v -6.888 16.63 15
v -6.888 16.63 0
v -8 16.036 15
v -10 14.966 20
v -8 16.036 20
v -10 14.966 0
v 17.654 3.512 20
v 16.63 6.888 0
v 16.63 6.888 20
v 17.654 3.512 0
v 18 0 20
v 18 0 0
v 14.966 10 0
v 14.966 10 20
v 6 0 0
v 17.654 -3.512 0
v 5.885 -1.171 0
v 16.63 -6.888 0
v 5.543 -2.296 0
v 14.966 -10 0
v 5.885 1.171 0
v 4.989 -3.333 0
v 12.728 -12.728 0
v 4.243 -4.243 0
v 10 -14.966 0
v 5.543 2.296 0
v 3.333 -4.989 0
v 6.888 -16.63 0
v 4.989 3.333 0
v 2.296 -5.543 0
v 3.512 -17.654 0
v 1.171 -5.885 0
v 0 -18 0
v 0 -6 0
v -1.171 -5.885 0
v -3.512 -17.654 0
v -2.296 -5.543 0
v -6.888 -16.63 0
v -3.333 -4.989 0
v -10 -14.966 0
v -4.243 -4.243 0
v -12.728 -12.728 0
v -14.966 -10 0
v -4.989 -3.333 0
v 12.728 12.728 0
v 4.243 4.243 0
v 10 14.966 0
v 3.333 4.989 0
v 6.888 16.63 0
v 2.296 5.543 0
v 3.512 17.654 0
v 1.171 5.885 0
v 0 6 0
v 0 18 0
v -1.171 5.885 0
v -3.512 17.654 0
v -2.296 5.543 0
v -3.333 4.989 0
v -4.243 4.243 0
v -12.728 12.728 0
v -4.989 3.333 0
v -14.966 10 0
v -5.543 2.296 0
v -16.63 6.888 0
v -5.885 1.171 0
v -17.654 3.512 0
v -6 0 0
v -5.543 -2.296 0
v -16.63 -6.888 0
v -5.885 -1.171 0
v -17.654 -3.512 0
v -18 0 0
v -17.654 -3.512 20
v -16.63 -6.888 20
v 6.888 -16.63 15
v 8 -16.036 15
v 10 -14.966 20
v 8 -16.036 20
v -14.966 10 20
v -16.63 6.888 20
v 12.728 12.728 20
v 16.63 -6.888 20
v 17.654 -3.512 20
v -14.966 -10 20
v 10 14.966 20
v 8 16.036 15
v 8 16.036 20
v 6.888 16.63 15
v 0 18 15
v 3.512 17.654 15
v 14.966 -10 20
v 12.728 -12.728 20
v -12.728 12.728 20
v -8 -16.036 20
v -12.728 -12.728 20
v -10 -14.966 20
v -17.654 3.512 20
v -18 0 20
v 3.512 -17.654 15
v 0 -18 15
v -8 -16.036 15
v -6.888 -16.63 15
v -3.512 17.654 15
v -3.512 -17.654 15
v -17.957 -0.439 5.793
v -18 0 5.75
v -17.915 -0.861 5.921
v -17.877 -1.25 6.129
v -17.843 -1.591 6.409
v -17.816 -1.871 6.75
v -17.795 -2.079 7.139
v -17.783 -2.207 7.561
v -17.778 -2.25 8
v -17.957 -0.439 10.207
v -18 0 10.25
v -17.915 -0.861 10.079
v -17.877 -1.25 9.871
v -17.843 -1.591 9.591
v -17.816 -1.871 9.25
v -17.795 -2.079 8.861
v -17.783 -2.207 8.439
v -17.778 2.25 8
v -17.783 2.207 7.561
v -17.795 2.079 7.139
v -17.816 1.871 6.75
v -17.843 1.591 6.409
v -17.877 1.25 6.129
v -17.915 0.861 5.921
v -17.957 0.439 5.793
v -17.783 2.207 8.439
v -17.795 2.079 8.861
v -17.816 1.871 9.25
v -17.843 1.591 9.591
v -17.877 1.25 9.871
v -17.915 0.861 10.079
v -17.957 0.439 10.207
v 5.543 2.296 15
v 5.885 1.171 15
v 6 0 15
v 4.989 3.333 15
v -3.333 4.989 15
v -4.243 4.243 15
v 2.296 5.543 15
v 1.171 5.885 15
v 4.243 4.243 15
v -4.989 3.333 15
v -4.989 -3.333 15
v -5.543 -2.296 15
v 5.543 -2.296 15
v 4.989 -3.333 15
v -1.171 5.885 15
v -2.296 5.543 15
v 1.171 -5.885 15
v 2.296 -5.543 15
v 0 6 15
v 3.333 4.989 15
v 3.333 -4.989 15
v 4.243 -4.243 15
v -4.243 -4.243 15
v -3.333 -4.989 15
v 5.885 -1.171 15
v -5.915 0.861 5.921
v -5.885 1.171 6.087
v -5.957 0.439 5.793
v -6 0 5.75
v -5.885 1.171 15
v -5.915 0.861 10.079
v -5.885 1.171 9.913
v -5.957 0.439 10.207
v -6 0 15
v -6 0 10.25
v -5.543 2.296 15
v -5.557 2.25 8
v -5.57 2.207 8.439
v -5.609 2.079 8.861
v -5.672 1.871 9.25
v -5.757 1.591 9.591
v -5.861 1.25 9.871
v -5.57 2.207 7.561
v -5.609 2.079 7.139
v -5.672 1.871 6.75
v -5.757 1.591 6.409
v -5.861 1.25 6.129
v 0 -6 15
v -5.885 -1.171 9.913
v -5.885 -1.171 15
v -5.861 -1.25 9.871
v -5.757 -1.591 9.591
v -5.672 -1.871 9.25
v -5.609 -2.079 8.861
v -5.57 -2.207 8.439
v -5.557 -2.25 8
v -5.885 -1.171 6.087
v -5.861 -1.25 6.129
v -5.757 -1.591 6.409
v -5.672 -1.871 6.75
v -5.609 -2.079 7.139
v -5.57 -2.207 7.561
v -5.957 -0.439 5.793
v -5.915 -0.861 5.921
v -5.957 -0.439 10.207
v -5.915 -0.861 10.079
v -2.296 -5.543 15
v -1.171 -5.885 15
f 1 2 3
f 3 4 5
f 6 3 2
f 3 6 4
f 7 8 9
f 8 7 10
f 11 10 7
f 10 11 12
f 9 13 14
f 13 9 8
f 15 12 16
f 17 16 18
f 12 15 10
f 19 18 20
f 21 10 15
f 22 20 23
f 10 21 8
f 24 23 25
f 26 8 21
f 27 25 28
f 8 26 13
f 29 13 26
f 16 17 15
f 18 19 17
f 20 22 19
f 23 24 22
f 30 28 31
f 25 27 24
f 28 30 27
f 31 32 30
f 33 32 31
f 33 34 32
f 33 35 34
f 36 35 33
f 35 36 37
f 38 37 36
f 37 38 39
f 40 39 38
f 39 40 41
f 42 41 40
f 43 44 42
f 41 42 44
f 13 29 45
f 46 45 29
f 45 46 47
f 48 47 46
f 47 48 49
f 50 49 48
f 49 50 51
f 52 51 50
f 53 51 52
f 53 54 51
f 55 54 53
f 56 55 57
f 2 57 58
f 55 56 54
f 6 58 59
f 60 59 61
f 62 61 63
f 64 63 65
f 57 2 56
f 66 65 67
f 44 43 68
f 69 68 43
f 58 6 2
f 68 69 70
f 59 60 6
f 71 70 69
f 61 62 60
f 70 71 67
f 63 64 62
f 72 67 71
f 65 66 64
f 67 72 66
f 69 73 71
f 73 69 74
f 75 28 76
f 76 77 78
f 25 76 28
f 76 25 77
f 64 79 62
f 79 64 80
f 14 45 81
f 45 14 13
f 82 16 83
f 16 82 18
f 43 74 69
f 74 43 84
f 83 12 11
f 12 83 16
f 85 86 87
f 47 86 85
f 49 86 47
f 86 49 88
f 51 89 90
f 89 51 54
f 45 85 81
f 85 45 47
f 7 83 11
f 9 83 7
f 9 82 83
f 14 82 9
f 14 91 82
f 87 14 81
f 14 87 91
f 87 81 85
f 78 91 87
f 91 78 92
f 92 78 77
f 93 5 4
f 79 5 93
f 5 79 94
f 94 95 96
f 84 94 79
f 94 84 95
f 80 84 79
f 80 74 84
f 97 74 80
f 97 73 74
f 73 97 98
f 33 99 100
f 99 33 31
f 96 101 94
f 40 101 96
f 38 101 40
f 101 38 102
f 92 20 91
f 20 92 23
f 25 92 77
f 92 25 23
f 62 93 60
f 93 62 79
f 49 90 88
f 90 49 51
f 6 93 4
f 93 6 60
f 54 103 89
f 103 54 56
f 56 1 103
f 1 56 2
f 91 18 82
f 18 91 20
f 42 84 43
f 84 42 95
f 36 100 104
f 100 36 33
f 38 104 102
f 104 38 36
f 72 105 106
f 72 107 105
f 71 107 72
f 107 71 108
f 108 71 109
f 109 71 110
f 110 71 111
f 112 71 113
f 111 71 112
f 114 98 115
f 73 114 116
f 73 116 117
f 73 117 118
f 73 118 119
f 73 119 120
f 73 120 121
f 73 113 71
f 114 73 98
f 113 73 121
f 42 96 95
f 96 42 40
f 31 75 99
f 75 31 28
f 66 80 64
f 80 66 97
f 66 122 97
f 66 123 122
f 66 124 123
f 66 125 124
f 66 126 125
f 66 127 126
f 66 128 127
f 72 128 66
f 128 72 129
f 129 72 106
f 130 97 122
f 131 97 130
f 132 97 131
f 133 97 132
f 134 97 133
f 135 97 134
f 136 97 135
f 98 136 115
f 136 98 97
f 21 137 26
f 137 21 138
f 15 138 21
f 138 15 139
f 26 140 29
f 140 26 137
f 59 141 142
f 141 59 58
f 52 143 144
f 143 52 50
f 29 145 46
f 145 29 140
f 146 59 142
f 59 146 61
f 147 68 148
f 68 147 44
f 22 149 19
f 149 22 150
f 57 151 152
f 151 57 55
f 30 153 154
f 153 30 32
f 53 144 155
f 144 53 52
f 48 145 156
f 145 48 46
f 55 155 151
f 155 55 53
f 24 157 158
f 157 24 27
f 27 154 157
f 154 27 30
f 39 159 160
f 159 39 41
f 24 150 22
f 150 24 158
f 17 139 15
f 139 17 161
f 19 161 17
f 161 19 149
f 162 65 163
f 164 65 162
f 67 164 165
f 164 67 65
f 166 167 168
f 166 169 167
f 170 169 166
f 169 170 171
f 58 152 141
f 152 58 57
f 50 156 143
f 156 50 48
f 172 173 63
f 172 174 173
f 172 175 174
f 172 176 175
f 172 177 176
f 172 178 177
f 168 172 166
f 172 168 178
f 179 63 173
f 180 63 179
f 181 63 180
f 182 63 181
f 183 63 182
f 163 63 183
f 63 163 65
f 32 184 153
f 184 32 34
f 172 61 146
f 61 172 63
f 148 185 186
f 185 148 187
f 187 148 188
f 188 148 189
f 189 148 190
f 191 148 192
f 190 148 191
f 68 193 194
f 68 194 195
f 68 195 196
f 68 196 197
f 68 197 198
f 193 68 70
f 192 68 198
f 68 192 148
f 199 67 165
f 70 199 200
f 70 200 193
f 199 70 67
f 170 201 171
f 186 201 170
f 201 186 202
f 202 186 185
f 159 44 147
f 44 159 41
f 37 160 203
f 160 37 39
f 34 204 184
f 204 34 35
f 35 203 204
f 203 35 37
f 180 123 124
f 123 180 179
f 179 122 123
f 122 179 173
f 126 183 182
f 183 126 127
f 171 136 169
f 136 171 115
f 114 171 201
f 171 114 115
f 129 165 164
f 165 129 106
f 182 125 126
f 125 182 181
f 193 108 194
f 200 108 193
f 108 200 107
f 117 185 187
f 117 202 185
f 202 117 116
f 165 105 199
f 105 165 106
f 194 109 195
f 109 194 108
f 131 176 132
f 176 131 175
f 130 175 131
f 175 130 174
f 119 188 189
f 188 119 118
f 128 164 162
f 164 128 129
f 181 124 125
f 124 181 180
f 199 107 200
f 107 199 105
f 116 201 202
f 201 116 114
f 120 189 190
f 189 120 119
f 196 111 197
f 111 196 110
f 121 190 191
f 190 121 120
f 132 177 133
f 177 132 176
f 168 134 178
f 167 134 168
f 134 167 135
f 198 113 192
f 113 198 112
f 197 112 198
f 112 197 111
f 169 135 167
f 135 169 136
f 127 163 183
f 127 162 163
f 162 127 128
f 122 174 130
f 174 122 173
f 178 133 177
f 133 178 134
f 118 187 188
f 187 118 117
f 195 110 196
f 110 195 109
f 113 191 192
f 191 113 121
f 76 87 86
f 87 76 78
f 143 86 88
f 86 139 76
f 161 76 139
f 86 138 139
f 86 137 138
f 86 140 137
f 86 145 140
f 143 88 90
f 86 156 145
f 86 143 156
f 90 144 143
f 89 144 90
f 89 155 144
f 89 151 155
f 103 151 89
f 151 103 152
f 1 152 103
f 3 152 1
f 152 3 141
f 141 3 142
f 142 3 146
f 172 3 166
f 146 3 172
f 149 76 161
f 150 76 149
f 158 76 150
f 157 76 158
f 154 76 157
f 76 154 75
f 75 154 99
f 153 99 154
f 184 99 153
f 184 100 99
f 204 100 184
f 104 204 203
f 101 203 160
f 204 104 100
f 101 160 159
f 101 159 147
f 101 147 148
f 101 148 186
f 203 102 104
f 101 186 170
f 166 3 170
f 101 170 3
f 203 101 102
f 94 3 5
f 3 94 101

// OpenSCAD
$fn = 32;

// ----------------------------------------------------------------------
// Oldham coupling hub: 36 x 20 mm
// ----------------------------------------------------------------------

// --- parameters (mm) ---
flange_dia = 36;          // hub diameter
flange_len = 16;          // hub length
hub_bore = 12;            // shaft bore
key_w = 16;               // drive tongue width
tongue_h = 4;             // drive tongue height
set_d = 4.5;              // set screw tap hole

module hub() {
  /* the slot side is a raised disc with a groove milled across it */
  cylinder(h = flange_len + tongue_h, d = flange_dia);
}

difference() {
  hub();
  translate([0, 0, -1]) cylinder(h = flange_len + tongue_h + 2, d = hub_bore);
  translate([-flange_dia / 2 - 1, 0, flange_len * 0.5])
    rotate([0, 90, 0]) cylinder(h = flange_dia / 2 + 2, d = set_d);
  translate([-key_w / 2, -flange_dia / 2 - 1, flange_len - 1])
    cube([key_w, flange_dia + 2, tongue_h + 1]);
}
